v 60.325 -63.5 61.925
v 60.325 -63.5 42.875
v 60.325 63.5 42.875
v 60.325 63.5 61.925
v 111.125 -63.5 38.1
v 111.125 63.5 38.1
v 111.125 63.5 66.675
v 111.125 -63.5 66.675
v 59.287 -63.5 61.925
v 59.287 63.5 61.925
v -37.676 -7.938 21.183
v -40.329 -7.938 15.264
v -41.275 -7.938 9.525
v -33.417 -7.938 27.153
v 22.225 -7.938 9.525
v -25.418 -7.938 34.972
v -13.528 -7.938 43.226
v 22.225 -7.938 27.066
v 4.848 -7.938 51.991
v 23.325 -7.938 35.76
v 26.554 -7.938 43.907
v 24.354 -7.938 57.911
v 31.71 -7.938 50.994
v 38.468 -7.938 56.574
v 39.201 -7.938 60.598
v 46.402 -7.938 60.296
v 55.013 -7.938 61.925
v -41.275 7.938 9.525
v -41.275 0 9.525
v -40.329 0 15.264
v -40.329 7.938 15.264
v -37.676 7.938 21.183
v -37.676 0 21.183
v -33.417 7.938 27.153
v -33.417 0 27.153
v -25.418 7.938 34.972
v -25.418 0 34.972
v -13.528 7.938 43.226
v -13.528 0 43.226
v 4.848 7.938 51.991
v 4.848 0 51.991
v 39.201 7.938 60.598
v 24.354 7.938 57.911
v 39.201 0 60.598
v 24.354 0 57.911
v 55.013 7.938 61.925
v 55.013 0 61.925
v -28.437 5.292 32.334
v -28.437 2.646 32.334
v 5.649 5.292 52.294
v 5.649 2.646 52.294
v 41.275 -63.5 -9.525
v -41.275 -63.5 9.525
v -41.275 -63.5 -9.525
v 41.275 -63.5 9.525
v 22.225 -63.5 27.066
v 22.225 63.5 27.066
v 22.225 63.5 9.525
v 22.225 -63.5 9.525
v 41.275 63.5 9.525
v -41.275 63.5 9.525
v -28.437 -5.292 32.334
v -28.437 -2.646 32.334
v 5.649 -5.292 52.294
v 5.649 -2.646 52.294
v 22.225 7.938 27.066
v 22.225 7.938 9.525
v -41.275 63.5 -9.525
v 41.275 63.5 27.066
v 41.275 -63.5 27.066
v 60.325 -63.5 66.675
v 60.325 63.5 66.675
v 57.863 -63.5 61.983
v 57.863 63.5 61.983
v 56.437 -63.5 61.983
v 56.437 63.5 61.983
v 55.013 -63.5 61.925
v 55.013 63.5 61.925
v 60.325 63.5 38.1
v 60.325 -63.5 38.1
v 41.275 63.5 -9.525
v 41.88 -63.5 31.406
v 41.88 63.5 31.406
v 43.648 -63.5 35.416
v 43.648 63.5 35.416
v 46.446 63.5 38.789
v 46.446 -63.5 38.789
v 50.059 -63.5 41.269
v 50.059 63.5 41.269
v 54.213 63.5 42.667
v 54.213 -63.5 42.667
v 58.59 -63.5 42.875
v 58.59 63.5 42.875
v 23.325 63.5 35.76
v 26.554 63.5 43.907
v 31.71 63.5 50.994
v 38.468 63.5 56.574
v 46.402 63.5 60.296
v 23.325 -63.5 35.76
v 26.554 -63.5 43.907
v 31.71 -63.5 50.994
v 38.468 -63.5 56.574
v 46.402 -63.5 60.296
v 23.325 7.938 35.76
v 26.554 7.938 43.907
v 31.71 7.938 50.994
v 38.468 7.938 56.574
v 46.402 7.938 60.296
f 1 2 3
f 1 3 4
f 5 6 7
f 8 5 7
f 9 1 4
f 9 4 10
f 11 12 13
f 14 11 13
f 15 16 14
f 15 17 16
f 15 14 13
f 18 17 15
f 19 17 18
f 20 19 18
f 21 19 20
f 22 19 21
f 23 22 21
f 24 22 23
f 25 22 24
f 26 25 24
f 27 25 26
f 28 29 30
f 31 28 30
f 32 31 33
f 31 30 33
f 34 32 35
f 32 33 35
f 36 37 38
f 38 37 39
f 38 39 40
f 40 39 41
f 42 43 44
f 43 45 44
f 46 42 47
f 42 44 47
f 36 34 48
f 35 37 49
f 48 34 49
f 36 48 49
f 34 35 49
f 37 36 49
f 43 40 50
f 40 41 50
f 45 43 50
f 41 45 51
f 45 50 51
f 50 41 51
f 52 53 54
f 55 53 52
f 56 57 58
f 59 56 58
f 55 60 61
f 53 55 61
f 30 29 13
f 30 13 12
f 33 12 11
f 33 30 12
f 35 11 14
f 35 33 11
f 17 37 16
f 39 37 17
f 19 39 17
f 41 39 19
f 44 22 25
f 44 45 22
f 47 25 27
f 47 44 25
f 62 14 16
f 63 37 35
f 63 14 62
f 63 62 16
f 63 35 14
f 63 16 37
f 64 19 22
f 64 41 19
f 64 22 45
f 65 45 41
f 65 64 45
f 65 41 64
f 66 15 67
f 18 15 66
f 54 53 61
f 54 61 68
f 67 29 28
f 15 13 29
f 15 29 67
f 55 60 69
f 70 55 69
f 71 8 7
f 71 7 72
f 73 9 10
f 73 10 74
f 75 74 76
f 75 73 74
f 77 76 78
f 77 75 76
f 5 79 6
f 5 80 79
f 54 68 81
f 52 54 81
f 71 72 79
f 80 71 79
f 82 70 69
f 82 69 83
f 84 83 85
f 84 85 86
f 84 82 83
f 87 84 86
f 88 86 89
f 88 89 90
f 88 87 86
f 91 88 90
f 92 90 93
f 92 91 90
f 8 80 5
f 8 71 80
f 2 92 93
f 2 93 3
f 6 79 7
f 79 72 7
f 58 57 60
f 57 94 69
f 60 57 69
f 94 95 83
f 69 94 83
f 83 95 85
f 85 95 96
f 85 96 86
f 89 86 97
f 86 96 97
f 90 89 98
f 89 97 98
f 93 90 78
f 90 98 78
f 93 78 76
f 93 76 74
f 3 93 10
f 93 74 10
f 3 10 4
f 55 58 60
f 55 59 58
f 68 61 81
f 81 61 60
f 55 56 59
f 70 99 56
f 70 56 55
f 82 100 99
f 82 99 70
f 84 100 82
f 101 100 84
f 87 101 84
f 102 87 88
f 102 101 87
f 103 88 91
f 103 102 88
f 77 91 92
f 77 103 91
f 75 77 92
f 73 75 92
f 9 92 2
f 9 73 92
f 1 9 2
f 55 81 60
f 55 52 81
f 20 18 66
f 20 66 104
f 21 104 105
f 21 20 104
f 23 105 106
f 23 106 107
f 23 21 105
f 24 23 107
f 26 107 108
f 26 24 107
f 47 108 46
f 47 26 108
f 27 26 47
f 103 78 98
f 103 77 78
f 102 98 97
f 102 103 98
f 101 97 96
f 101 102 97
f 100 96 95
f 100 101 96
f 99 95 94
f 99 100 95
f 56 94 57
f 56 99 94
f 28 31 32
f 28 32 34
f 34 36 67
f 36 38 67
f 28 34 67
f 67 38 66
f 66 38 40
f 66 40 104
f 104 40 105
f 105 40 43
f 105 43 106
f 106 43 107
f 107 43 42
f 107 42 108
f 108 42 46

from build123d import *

# Parameters (mm, degrees)
F1_DEPTH = 63.5
F2_DEPTH = 63.5
F3_DEPTH = 63.5
F4_DEPTH = 7.9375


with BuildPart() as f1:
    # F0 (on Front) → F1 (new body, symmetric)
    with BuildSketch(Plane.XZ):
        Polygon((41.275, -9.525), (41.275, 9.525), (22.225, 9.525), (-41.275, 9.525), (-41.275, -9.525), align=None)
    extrude(amount=F1_DEPTH, both=True)


with BuildPart() as f2:
    # F0 (on Front) → F2 (new body, symmetric)
    with BuildSketch(Plane.XZ):
        Polygon((60.325, 61.9252), (60.325, 42.8752), (60.325, 38.1), (111.125, 38.1), (111.125, 66.675), (60.325, 66.675), align=None)
    extrude(amount=F2_DEPTH, both=True)


with BuildPart() as f3:
    # F0 (on Front) → F3 (new body, symmetric)
    with BuildSketch(Plane.XZ):
        with BuildLine():
            Line((22.225, 9.525), (41.275, 9.525))
            Line((41.275, 9.525), (41.275, 27.065663))
            ThreePointArc((41.275, 27.065663), (46.445971, 38.789118), (58.590198, 42.8752))
            Line((58.590198, 42.8752), (60.325, 42.8752))
            Line((60.325, 42.8752), (60.325, 61.9252))
            Line((60.325, 61.9252), (59.287362, 61.9252))
            ThreePointArc((59.287362, 61.9252), (57.15, 61.990663), (55.012638, 61.9252))
            ThreePointArc((55.012638, 61.9252), (31.709845, 50.993766), (22.225, 27.065663))
            Line((22.225, 27.065663), (22.225, 9.525))
        make_face()
    extrude(amount=F3_DEPTH, both=True)


with BuildPart() as f4:
    # F0 (on Front) → F4 (new body, symmetric)
    with BuildSketch(Plane.XZ):
        with BuildLine():
            Line((-41.275, 9.525), (22.225, 9.525))
            Line((22.225, 9.525), (22.225, 27.065663))
            ThreePointArc((22.225, 27.065663), (31.709845, 50.993766), (55.012638, 61.9252))
            add(Edge.make_bspline(
                [(-41.275, 9.525), (-41.051786, 31.264443), (0, 59.951846), (55.012638, 61.9252)],
                knots=[0, 0, 0, 0, 109.622489, 109.622489, 109.622489, 109.622489], degree=3))
        make_face()
    extrude(amount=F4_DEPTH, both=True)


solid = Compound([f1.part, f2.part, f3.part, f4.part])
